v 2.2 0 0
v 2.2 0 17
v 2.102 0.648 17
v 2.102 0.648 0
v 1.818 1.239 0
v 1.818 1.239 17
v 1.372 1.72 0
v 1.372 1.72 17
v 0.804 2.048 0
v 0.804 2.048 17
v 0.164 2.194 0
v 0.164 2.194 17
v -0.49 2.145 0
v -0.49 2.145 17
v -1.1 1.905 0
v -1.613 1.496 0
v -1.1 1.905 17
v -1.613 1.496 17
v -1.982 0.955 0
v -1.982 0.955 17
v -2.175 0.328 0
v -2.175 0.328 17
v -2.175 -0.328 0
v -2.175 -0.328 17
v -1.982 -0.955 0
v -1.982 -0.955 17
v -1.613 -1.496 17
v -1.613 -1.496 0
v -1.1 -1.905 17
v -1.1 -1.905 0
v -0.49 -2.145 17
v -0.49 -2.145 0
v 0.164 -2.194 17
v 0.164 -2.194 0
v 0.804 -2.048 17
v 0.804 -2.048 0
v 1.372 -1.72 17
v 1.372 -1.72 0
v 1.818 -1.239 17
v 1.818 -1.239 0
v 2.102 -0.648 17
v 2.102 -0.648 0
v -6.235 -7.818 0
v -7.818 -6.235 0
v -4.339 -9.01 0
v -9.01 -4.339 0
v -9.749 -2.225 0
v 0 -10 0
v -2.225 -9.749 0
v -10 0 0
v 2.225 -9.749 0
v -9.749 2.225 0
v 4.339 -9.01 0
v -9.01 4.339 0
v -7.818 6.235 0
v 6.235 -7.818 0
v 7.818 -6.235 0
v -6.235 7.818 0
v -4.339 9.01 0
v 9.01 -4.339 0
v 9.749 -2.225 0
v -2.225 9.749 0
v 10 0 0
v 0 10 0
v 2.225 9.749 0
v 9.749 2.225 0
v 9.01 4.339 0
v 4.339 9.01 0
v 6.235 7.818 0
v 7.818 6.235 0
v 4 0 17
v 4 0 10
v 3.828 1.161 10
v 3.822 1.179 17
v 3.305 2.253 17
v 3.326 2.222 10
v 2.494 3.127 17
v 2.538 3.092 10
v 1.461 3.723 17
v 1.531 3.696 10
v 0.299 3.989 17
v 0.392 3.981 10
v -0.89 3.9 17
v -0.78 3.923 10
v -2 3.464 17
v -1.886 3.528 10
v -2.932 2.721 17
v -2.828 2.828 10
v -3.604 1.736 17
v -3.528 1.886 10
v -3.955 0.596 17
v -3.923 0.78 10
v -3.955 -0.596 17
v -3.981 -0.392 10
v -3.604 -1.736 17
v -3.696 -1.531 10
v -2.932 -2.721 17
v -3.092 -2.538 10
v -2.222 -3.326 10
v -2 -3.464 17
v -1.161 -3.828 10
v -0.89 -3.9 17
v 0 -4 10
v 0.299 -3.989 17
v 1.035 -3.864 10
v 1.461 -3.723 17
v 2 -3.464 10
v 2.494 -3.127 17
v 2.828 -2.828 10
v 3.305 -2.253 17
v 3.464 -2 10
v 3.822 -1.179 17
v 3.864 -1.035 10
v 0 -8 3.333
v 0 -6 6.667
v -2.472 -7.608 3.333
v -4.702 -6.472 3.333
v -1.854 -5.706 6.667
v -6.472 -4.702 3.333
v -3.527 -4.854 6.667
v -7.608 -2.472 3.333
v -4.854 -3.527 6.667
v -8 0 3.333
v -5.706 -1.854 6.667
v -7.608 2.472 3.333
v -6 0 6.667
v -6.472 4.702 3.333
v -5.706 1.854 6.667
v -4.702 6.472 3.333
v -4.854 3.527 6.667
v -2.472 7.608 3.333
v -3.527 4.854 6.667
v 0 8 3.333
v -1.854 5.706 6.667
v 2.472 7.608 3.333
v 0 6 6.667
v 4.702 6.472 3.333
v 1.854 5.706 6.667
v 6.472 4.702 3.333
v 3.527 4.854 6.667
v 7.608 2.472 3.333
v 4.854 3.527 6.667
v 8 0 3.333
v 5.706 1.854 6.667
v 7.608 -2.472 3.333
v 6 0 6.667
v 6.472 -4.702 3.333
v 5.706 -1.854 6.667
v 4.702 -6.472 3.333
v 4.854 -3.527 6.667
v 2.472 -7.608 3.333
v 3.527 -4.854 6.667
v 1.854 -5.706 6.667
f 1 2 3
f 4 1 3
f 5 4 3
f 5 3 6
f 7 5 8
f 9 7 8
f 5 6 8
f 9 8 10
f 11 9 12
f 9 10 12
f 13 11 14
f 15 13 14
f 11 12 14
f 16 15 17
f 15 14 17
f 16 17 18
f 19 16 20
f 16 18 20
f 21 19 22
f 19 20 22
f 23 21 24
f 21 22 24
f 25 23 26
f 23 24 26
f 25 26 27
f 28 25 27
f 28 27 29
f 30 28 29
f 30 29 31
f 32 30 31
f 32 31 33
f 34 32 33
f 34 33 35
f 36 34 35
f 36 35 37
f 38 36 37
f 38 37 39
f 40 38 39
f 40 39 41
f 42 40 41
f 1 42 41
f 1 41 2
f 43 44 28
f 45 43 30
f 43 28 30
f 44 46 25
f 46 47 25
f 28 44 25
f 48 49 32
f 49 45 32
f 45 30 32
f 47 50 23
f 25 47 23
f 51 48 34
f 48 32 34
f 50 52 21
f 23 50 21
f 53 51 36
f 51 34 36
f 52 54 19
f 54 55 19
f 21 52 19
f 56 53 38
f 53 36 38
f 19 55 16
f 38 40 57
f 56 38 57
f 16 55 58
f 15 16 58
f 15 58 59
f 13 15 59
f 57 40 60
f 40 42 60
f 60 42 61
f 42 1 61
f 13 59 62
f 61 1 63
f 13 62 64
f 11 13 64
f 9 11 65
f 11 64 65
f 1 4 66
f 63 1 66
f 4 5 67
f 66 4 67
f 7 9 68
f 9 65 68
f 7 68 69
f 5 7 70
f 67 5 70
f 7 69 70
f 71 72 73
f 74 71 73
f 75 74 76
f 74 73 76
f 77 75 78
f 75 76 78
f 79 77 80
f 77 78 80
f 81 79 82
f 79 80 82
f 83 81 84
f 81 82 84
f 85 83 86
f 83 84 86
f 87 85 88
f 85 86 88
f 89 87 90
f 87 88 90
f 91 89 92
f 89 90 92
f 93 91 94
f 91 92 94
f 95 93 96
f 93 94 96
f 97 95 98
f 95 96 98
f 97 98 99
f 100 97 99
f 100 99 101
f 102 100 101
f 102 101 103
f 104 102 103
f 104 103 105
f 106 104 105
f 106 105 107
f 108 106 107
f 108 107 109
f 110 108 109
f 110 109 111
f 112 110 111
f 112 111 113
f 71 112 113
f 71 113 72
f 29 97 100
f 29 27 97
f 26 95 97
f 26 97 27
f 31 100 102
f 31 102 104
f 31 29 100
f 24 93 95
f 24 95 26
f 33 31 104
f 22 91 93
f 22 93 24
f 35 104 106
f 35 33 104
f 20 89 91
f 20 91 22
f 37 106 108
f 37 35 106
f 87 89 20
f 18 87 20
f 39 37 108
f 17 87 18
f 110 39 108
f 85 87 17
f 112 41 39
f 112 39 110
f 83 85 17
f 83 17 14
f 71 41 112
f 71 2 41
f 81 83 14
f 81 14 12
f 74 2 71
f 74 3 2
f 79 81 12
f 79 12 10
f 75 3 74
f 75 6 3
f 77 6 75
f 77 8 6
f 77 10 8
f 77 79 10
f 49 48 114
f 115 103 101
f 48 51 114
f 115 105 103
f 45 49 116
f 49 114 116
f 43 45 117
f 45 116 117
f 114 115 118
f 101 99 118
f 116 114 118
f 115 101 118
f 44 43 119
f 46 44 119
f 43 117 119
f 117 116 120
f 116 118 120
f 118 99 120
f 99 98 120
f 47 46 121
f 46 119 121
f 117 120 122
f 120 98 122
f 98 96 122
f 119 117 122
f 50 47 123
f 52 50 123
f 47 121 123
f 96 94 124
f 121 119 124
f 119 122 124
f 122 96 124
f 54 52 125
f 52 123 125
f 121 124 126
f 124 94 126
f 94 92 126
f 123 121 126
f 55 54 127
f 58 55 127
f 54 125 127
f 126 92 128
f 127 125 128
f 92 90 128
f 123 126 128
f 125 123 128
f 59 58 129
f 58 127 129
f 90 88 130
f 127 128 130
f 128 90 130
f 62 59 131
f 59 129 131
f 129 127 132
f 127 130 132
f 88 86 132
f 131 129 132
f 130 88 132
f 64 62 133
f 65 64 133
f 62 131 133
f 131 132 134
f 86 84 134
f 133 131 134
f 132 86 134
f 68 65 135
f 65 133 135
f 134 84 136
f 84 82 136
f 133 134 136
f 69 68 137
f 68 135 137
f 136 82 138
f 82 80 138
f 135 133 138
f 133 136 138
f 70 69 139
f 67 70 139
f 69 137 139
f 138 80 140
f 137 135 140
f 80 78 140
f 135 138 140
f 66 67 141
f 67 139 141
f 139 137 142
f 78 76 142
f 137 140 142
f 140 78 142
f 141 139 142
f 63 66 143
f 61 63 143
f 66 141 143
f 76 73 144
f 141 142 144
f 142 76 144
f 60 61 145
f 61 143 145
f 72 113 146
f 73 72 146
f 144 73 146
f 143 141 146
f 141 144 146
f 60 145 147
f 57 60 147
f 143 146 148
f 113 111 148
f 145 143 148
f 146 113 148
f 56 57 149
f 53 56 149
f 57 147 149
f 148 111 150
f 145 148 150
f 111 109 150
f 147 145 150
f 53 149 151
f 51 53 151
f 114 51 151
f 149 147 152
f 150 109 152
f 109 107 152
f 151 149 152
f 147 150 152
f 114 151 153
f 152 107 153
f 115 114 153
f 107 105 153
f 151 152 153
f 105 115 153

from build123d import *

# Parameters (mm, degrees)
SKETCH1_R           = 10
BOSS_EXTRUDE1_DEPTH = 10
SKETCH3_R           = 4
BOSS_EXTRUDE2_DEPTH = 7
SKETCH4_R           = 2.2
CUT_EXTRUDE1_DEPTH  = 18


with BuildPart() as part:
    # Sketch1 → Boss-Extrude1 (new body)
    with BuildSketch(Plane.XY):
        Circle(SKETCH1_R)
    extrude(amount=BOSS_EXTRUDE1_DEPTH)

    # Sketch2 → Cut-Revolve2 (revolve, cut)
    with BuildSketch(Plane(origin=(0, 0, 0), x_dir=(0, 0, -1), z_dir=(1, 0, 0))):
        Polygon((0, -10), (-10, -4), (-10, -10), align=None)
    revolve(axis=Axis((0, 0, 10), (0, 0, -1)), mode=Mode.SUBTRACT)

    # Sketch3 → Boss-Extrude2 (add)
    with BuildSketch(Plane.XY.offset(10)):
        Circle(SKETCH3_R)
    extrude(amount=BOSS_EXTRUDE2_DEPTH)

    # Sketch4 → Cut-Extrude1 (cut, through all)
    with BuildSketch(Plane.XY.offset(17)):
        Circle(SKETCH4_R)
    extrude(amount=-CUT_EXTRUDE1_DEPTH, mode=Mode.SUBTRACT)


solid = part.part
